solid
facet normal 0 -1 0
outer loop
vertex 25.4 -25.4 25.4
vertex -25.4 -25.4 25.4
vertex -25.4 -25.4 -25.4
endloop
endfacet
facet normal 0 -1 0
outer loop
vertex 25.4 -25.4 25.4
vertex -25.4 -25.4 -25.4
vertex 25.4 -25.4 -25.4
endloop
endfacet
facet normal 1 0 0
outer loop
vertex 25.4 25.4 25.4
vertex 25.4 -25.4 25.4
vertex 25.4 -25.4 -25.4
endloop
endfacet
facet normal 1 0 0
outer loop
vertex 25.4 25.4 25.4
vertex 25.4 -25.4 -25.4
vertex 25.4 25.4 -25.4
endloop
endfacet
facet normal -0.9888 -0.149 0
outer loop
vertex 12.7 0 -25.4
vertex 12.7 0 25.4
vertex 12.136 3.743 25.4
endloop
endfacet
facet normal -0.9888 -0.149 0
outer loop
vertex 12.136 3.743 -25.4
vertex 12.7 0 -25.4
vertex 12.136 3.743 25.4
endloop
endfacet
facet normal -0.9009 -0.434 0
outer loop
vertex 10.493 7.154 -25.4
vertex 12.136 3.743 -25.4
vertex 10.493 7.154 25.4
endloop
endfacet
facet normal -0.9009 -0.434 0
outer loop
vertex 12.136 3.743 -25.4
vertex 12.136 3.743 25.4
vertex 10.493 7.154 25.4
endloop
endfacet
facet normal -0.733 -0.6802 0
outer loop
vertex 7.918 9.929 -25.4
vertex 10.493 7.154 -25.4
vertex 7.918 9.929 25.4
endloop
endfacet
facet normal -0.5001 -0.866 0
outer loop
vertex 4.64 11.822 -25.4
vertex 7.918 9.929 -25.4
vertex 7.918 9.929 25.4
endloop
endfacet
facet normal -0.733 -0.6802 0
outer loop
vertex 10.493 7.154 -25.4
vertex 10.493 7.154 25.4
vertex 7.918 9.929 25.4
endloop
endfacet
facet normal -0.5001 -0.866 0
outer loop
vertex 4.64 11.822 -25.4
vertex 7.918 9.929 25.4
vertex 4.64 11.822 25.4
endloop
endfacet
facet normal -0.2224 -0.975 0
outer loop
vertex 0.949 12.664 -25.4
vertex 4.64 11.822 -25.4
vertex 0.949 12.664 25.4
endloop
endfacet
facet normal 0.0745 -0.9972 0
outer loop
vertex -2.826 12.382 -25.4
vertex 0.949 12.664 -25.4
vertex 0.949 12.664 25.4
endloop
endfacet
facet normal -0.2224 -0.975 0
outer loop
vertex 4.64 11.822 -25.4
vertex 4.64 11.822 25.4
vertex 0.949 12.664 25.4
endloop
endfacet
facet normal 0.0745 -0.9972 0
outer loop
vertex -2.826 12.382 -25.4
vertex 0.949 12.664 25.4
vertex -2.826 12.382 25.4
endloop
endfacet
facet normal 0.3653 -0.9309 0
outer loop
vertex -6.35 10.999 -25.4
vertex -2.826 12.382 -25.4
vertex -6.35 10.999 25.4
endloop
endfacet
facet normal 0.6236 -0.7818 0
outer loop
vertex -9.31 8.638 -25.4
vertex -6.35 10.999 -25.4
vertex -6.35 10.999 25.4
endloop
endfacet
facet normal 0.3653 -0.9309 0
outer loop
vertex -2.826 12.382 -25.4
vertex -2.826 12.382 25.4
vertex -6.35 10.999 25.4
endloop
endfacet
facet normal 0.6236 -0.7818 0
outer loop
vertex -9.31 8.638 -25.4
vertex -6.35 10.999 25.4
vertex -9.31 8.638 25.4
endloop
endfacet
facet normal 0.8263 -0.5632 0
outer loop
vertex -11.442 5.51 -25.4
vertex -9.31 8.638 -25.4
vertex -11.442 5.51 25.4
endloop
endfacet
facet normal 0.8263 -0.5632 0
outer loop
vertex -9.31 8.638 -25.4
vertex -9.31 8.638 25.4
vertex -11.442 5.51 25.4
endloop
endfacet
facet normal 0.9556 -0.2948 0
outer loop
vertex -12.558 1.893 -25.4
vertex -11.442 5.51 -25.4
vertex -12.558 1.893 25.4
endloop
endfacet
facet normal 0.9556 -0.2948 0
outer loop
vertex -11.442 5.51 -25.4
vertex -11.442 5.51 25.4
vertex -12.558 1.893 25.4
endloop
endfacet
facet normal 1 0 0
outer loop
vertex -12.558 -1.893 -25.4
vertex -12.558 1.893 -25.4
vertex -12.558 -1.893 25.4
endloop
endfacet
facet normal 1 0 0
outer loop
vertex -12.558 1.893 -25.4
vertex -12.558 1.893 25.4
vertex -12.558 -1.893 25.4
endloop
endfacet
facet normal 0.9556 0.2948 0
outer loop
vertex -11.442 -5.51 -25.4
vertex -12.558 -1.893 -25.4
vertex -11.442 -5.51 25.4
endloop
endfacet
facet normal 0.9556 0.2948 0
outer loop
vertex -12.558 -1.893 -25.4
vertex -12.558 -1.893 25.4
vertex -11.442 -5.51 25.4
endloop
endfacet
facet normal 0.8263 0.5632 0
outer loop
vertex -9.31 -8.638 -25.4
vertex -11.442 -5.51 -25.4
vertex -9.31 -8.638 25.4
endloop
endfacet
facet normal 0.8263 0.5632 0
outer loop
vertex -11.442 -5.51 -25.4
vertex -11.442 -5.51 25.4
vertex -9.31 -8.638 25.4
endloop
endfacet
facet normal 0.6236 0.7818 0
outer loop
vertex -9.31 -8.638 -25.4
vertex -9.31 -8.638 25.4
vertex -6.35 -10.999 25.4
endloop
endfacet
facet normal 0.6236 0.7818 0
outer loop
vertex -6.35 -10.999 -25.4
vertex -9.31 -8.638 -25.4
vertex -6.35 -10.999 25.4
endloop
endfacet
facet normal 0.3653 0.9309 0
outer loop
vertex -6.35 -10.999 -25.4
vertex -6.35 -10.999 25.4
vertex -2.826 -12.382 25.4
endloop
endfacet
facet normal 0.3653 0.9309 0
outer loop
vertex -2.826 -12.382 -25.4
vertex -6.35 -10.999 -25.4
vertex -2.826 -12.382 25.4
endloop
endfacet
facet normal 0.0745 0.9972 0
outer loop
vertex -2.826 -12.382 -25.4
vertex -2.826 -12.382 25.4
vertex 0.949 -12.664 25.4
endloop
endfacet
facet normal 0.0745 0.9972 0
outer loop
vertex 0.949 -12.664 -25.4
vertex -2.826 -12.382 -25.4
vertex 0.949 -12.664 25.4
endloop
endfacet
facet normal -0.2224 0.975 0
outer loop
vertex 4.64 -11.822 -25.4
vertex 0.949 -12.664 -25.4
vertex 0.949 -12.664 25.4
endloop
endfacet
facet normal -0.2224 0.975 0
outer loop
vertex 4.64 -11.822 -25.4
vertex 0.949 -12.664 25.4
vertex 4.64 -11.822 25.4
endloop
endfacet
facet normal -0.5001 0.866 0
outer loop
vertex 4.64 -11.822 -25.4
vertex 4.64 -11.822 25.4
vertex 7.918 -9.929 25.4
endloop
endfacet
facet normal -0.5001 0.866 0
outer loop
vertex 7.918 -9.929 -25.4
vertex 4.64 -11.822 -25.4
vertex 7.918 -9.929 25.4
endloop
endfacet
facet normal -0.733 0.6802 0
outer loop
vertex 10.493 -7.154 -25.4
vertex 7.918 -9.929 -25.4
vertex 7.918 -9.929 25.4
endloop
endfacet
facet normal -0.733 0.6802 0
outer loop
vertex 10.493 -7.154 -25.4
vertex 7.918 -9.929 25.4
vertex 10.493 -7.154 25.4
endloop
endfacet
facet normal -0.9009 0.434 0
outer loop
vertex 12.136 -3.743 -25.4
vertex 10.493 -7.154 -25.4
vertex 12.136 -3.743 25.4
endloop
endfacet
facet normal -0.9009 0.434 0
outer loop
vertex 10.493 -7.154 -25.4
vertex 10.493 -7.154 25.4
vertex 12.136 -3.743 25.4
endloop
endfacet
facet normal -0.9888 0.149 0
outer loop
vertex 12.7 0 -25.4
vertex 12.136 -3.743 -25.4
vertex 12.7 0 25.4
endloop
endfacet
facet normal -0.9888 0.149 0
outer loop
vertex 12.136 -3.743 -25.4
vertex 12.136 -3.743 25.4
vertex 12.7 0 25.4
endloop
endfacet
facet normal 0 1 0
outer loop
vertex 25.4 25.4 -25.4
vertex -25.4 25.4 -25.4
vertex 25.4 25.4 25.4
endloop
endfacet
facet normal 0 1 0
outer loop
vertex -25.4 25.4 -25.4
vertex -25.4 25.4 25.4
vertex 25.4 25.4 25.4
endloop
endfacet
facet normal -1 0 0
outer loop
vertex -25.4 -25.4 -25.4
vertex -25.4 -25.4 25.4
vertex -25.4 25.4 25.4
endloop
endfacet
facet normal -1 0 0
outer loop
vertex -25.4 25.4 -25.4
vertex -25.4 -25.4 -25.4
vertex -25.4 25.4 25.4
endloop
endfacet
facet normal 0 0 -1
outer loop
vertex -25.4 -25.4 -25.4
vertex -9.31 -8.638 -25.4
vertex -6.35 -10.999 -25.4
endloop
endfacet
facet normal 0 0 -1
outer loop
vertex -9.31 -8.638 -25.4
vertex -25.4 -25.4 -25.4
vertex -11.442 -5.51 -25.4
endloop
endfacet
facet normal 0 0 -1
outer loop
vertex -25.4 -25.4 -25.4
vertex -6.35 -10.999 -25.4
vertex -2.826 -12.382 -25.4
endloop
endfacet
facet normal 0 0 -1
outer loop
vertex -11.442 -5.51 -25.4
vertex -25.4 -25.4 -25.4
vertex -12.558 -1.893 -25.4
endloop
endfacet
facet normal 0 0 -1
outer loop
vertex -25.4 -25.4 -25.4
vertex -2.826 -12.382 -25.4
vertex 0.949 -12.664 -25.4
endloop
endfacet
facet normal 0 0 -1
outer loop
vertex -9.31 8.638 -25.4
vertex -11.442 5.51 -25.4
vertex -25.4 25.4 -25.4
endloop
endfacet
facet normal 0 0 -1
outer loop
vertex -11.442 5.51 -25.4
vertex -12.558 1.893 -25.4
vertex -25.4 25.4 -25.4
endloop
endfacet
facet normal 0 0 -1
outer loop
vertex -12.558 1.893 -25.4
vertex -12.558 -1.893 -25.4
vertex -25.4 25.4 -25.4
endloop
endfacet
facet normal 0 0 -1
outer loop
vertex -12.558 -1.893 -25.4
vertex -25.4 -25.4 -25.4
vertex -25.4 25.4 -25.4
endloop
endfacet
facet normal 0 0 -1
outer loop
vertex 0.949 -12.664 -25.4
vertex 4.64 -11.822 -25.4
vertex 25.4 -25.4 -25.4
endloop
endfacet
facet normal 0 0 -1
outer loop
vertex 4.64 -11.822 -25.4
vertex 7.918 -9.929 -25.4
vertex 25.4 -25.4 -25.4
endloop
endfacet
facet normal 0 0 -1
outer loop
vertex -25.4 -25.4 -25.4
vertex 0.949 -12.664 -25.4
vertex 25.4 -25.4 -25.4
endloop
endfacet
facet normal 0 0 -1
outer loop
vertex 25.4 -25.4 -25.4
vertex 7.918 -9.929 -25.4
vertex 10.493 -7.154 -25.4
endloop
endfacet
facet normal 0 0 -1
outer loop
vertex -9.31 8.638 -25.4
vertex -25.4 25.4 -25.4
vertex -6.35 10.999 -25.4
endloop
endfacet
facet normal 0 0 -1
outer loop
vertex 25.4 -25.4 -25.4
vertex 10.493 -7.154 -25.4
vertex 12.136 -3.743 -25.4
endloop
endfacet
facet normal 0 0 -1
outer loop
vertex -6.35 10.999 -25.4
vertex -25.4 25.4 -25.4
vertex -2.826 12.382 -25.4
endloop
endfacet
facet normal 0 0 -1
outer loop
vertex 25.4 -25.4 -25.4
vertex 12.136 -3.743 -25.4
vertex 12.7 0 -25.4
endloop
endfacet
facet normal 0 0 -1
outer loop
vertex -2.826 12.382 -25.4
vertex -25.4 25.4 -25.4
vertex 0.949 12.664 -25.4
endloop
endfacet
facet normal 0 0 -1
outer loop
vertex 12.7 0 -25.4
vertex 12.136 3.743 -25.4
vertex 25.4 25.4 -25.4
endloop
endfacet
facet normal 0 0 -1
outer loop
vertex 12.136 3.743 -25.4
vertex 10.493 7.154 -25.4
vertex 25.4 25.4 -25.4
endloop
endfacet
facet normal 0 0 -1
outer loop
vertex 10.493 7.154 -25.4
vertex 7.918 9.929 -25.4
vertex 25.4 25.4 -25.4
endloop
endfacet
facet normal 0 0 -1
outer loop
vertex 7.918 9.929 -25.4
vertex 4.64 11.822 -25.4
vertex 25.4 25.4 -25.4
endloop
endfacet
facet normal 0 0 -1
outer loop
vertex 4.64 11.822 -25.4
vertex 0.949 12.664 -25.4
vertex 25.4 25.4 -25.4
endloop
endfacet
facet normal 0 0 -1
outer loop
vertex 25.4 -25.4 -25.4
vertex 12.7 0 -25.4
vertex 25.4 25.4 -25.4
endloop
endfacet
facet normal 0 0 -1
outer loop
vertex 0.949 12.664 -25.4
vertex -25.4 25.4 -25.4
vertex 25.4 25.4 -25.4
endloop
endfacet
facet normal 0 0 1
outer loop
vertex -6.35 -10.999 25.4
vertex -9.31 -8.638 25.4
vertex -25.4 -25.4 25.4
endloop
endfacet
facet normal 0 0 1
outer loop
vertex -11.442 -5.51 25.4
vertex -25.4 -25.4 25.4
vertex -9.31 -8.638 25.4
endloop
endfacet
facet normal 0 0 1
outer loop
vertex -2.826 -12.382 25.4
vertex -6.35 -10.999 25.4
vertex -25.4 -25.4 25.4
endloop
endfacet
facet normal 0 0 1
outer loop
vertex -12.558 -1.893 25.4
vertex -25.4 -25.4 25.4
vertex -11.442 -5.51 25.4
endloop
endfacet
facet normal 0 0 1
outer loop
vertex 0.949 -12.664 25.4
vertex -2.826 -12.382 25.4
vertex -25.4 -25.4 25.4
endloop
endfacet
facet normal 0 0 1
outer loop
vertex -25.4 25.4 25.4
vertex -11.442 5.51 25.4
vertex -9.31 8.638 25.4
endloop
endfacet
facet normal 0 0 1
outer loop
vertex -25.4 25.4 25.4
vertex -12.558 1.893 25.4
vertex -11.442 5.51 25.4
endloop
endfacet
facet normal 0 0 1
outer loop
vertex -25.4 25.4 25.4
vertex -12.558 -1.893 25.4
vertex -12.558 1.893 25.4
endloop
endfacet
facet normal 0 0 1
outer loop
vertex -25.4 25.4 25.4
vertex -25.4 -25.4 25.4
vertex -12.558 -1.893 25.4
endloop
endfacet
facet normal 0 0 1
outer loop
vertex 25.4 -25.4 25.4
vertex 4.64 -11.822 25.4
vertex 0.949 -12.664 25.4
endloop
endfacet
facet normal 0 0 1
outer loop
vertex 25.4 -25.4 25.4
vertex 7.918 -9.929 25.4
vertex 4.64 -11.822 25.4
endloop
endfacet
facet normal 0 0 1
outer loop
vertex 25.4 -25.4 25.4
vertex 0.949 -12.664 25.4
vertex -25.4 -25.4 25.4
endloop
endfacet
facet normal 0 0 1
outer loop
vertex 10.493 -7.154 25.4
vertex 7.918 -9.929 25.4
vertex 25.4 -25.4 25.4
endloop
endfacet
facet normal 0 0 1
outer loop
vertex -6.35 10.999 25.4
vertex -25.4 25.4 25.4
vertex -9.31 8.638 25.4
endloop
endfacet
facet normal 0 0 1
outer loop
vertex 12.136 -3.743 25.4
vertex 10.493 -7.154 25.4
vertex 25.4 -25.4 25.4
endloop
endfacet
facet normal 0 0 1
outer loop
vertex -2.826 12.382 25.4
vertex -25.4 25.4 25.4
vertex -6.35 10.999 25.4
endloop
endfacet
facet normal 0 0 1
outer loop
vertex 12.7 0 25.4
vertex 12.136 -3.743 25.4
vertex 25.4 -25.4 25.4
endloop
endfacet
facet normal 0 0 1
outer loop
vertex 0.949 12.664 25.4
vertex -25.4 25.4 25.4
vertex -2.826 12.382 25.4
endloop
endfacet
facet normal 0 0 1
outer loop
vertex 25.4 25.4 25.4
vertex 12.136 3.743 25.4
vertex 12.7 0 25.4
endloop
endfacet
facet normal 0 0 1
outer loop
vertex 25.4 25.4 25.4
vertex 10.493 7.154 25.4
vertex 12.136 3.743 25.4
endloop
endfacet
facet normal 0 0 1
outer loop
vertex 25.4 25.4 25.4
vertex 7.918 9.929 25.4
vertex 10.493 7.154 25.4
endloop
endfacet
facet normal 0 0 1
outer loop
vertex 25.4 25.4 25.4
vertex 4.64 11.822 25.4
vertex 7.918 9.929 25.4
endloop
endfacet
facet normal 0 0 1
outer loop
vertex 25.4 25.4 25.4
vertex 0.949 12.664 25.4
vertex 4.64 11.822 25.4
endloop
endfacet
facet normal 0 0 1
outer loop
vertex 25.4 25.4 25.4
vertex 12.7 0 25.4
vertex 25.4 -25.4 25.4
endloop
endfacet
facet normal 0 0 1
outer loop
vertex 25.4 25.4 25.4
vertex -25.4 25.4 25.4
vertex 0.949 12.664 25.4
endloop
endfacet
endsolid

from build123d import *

# Parameters (mm, degrees)
F0_W     = 50.8
F0_H     = 50.8
F1_DEPTH = 25.4
F2_R     = 12.7
F3_DEPTH = 50.8


with BuildPart() as f1:
    # F0 (on Top) → F1 (new body, symmetric)
    with BuildSketch(Plane.XY):
        Rectangle(F0_W, F0_H)
    extrude(amount=F1_DEPTH, both=True)

    # F2 (on face) → F3 (cut, through all)
    with BuildSketch(Plane.XY.offset(25.4)):
        Circle(F2_R)
    extrude(amount=-F3_DEPTH, mode=Mode.SUBTRACT)


solid = f1.part
